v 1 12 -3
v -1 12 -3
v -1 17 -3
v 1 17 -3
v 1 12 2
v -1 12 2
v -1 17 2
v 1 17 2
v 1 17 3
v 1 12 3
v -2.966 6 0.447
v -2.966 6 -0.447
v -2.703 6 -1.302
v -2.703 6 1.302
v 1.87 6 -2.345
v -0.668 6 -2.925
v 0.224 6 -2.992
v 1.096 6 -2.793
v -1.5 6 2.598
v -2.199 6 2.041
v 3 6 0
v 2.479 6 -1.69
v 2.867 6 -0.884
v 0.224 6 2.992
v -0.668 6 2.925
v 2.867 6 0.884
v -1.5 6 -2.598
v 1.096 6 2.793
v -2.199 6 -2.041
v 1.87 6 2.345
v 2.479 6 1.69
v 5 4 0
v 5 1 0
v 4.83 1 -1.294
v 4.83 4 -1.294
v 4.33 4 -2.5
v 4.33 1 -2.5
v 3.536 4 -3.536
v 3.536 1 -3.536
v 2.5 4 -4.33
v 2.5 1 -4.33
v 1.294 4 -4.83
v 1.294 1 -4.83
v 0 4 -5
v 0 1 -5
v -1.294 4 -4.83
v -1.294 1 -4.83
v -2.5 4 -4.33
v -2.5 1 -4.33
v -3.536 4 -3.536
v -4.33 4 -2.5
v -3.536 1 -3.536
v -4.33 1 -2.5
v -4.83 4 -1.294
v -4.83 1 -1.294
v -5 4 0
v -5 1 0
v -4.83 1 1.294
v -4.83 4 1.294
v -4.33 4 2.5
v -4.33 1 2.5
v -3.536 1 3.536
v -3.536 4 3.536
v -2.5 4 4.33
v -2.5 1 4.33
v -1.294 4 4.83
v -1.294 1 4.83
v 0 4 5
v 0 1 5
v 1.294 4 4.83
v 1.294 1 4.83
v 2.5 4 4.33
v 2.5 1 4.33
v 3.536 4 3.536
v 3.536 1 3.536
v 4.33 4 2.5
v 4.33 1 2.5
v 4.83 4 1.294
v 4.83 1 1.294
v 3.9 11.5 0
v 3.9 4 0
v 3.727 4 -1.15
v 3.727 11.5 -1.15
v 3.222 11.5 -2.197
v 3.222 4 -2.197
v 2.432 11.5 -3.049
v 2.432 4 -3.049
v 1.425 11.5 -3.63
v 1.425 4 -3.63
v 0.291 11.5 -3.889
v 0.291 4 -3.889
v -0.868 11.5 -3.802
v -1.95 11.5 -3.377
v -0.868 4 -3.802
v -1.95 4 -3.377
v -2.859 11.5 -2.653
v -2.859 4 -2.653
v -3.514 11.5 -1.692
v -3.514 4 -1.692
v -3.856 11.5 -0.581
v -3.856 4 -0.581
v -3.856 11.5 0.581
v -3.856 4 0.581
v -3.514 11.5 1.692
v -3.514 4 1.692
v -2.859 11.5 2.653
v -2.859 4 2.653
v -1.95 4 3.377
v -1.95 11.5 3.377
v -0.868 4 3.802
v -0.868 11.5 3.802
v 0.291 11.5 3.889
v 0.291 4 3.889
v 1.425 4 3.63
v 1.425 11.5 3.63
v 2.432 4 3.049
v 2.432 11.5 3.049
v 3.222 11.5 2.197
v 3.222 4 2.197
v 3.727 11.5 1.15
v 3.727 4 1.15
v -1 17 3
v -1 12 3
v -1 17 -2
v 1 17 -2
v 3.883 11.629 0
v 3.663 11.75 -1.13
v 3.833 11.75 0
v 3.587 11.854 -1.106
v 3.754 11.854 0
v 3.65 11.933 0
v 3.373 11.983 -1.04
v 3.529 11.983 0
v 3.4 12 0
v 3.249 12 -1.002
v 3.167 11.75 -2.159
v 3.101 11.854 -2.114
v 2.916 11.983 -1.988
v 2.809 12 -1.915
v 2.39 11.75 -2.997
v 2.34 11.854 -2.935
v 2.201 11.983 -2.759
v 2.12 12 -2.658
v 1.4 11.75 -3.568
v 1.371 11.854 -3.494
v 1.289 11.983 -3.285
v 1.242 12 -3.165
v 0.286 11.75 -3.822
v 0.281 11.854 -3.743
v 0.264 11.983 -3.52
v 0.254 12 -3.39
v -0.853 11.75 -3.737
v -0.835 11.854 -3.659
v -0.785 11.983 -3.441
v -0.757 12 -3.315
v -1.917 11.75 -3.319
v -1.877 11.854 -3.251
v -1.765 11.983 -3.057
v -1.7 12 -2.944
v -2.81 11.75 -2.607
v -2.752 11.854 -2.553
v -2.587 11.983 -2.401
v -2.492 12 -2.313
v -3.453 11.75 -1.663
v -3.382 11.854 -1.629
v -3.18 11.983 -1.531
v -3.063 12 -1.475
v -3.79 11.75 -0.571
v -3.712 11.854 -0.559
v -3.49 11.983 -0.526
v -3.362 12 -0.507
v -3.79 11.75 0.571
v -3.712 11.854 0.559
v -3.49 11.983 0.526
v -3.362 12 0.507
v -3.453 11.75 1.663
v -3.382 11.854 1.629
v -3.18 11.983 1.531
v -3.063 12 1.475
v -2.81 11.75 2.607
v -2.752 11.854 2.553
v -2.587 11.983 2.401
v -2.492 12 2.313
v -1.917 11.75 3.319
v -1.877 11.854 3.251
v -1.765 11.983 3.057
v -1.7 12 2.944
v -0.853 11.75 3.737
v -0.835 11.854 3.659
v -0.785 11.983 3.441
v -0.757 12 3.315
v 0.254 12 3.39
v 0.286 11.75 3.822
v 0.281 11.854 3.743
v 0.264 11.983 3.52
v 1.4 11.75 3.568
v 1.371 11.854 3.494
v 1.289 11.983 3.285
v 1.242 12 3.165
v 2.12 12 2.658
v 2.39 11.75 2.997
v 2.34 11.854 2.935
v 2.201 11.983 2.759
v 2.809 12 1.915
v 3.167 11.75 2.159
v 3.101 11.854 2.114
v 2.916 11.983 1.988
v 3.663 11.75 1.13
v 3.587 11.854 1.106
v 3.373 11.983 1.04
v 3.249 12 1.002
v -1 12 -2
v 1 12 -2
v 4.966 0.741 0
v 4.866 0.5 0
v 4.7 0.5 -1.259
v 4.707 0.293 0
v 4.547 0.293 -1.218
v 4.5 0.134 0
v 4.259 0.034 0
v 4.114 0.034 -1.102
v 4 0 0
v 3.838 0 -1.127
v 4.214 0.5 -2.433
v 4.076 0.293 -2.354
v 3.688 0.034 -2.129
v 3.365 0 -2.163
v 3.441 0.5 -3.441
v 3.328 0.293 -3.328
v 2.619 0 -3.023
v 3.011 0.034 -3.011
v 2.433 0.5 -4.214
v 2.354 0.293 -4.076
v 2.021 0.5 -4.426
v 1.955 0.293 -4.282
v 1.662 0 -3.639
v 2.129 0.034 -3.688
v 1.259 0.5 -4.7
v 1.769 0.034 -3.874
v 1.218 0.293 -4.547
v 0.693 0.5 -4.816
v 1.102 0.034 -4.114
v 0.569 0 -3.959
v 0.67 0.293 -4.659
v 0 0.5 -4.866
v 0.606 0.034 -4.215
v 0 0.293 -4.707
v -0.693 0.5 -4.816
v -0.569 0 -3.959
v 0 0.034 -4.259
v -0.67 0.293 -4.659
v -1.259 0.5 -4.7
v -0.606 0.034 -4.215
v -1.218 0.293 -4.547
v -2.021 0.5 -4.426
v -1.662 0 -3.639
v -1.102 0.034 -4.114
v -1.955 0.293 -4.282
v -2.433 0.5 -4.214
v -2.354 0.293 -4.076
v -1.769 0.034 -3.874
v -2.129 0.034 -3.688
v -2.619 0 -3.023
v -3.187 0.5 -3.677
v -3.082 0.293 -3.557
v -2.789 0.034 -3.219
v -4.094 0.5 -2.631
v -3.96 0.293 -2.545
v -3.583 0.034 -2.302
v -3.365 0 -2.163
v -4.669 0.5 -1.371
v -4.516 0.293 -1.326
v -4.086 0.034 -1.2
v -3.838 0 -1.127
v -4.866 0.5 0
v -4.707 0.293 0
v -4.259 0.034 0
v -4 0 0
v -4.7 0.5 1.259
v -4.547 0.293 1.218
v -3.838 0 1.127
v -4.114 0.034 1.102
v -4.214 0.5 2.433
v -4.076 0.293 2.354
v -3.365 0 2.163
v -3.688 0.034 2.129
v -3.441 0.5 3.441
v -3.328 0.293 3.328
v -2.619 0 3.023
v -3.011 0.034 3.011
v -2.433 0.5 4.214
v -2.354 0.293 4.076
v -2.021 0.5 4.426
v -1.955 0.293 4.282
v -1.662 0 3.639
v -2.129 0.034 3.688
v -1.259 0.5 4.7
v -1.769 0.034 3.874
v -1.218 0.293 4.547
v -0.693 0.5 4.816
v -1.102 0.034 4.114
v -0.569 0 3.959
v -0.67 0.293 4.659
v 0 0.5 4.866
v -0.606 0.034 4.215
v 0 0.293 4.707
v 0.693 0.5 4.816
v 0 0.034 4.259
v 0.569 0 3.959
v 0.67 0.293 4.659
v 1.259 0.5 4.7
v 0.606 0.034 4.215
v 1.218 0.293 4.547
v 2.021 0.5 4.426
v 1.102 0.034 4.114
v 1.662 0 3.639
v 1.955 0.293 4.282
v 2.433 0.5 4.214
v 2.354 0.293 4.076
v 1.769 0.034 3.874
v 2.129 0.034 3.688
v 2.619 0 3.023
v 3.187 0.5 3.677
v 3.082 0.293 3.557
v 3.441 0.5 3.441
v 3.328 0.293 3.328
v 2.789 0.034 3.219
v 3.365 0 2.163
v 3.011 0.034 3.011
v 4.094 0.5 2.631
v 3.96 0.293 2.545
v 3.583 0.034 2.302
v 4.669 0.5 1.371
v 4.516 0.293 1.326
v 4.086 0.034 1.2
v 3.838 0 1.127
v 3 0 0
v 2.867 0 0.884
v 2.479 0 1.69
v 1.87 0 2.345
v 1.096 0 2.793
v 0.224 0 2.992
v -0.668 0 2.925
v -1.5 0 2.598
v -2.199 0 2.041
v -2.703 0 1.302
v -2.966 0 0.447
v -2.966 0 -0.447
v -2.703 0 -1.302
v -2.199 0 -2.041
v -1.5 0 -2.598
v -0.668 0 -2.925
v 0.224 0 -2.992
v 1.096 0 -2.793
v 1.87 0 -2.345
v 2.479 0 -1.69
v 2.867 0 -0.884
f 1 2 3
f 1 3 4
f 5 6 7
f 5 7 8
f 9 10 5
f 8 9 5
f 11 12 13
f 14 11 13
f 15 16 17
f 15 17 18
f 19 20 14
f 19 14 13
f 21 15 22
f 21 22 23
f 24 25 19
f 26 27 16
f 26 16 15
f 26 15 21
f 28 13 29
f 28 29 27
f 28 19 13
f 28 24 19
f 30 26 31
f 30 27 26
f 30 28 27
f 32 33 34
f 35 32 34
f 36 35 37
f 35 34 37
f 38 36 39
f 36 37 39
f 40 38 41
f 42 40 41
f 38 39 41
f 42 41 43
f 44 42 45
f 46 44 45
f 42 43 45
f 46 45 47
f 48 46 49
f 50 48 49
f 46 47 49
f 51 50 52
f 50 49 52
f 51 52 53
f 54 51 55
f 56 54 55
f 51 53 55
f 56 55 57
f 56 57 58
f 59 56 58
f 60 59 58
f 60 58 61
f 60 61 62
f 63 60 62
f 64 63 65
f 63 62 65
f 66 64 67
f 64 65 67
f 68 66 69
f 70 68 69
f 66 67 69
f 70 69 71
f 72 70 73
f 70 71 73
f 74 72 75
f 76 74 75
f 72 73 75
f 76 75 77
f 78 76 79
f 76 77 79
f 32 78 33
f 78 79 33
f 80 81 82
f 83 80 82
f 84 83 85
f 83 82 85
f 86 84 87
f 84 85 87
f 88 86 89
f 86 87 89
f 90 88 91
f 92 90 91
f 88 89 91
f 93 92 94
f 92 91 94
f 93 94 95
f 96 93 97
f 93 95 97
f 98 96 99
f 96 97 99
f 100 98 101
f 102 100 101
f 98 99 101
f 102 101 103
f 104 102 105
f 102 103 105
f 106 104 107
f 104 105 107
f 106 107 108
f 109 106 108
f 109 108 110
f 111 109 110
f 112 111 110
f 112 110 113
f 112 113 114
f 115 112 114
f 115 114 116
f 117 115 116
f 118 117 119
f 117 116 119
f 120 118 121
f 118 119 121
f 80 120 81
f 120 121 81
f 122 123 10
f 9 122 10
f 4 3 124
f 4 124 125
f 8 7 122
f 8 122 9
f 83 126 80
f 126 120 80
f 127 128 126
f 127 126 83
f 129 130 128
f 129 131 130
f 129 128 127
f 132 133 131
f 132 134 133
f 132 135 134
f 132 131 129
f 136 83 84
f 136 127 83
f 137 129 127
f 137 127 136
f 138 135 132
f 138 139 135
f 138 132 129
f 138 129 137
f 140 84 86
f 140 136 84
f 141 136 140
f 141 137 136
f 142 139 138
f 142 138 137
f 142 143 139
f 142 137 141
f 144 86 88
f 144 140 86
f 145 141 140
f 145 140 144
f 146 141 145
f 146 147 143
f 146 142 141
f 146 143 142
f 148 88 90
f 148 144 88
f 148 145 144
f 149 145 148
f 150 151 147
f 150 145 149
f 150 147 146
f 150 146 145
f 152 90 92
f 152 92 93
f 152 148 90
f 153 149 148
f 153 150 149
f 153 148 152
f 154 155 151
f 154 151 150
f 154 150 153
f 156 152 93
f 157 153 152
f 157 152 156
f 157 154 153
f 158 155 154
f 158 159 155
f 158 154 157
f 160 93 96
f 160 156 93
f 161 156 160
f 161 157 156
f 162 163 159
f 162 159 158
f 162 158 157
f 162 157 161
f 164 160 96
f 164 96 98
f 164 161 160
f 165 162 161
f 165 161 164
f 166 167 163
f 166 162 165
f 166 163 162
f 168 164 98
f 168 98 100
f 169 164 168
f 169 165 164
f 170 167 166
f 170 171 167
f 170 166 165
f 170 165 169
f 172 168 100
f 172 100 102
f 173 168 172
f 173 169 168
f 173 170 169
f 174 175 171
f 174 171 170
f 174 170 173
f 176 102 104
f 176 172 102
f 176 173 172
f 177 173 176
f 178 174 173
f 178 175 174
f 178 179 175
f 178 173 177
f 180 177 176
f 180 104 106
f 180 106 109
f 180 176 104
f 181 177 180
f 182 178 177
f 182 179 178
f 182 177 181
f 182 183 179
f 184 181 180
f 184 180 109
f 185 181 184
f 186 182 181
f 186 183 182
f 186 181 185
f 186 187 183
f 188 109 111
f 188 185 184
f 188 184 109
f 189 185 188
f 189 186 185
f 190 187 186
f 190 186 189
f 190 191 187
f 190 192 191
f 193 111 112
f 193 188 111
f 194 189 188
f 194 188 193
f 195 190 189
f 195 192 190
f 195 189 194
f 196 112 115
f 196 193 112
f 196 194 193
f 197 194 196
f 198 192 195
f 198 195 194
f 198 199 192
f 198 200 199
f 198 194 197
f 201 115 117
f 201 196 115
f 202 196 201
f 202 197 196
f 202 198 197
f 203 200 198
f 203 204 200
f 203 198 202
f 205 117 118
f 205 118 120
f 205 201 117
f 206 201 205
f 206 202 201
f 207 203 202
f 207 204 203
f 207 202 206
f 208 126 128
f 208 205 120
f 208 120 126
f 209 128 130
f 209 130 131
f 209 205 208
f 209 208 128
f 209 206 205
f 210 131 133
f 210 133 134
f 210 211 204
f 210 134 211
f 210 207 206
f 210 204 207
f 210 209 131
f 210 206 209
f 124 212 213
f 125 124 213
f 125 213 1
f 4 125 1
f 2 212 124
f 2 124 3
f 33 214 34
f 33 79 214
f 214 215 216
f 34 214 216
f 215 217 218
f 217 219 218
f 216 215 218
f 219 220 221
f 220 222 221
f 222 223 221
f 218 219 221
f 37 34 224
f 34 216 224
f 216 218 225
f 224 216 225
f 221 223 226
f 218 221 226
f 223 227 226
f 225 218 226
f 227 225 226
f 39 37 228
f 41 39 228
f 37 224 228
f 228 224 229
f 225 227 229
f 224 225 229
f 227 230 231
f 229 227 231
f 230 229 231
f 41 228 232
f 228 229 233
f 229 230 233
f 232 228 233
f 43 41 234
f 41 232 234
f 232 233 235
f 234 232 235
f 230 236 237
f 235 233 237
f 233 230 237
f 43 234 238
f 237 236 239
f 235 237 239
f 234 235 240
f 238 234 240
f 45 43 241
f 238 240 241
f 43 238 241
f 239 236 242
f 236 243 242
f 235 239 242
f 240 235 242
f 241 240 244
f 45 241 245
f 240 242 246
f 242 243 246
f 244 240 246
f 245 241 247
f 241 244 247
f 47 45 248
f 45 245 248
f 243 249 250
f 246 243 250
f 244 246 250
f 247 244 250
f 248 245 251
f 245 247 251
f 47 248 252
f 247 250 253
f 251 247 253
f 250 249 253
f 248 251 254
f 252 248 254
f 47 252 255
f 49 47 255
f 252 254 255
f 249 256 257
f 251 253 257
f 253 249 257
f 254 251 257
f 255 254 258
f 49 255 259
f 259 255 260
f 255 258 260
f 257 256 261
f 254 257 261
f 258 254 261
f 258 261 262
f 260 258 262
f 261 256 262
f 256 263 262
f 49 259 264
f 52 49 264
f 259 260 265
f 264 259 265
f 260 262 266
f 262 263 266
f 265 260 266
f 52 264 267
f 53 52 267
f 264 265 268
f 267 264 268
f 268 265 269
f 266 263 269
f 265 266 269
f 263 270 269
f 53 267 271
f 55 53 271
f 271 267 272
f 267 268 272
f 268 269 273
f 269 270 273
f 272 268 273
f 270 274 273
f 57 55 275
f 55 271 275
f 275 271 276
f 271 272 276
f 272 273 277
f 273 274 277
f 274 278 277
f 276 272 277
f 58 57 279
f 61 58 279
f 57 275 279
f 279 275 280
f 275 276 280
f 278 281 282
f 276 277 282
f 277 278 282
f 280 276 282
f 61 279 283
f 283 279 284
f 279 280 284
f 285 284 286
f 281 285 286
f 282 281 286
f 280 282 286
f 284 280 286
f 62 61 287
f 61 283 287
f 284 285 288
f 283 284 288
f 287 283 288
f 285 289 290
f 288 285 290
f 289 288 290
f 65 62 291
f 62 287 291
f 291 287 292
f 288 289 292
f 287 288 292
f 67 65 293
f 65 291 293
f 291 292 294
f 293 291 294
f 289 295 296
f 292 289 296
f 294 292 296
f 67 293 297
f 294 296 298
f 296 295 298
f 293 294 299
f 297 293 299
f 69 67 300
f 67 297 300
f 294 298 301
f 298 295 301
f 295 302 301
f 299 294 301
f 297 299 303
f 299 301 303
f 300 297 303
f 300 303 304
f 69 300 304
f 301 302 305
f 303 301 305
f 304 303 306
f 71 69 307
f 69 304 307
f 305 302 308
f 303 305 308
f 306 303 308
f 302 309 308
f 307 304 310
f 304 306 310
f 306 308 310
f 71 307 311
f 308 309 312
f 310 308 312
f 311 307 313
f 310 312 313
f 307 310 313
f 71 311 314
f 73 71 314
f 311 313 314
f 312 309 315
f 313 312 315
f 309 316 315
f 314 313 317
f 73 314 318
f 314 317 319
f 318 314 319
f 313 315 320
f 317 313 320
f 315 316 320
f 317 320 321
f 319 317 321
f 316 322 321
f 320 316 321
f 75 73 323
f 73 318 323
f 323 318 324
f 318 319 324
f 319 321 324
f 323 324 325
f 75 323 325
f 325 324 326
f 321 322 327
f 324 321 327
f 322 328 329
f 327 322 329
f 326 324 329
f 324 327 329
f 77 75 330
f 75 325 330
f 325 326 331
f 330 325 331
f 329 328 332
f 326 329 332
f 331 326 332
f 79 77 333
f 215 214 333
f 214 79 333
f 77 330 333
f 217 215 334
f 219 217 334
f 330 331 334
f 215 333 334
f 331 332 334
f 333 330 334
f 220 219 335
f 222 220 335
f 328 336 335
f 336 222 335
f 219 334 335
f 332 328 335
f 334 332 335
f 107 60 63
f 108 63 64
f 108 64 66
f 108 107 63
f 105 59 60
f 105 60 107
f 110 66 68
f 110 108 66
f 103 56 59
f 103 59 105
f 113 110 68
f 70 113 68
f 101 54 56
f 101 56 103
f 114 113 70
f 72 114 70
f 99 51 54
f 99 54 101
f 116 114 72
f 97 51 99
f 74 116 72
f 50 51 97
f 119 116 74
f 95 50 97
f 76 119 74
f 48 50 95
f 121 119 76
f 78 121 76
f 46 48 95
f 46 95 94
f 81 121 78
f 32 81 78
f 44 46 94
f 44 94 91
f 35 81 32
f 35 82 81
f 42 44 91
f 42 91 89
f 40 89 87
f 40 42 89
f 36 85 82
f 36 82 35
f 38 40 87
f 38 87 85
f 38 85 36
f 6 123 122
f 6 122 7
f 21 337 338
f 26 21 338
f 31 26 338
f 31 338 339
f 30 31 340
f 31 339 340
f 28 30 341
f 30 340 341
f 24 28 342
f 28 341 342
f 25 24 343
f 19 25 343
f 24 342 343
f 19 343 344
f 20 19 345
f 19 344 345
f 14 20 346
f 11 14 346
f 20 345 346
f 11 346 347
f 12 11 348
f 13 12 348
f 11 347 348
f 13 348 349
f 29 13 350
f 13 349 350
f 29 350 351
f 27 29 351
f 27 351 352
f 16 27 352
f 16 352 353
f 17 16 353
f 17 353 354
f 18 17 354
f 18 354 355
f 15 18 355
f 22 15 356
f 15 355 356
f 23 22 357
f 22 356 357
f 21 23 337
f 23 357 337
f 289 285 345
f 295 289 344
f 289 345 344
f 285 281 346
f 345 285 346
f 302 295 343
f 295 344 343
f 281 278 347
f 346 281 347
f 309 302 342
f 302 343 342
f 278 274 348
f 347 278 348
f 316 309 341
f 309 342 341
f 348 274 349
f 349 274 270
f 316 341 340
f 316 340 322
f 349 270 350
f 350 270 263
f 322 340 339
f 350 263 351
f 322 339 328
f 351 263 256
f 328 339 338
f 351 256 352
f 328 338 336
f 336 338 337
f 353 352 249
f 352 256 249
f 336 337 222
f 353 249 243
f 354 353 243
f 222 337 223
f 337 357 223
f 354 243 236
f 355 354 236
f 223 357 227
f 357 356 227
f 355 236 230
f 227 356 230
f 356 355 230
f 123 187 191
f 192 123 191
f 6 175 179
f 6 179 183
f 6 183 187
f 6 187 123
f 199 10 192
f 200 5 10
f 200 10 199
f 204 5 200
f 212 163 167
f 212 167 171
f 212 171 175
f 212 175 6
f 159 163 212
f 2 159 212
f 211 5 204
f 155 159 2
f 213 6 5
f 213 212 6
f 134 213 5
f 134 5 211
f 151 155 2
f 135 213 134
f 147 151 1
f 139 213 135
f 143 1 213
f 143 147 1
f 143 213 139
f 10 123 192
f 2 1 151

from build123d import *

# Parameters (mm, degrees)
ESQUISSE1_R             = 5
BOSS_EXTRU_1_DEPTH      = 4
ESQUISSE2_R             = 3.9
BOSS_EXTRU_2_DEPTH      = 8
CONG_1_R                = 1
ESQUISSE3_R             = 3
ENL_V_MAT_EXTRU_2_DEPTH = 6
ESQUISSE4_W             = 2
ESQUISSE4_H             = 1
BOSS_EXTRU_3_DEPTH      = 5
CONG_2_R                = 0.5


with BuildPart() as part:
    # Esquisse1 → Boss.-Extru.1 (new body)
    with BuildSketch(Plane(origin=(0, 0, 0), x_dir=(1, 0, 0), z_dir=(0, 1, 0))):
        Circle(ESQUISSE1_R)
    extrude(amount=BOSS_EXTRU_1_DEPTH)

    # Esquisse2 → Boss.-Extru.2 (add)
    with BuildSketch(Plane(origin=(0, 4, 0), x_dir=(1, 0, 0), z_dir=(0, 1, 0))):
        Circle(ESQUISSE2_R)
    extrude(amount=BOSS_EXTRU_2_DEPTH)

    # Congé1
    cong_1_edges = [part.edges().sort_by_distance(p)[0] for p in [
        (-5, 0, 0),
    ]]
    fillet(cong_1_edges, radius=CONG_1_R)

    # Esquisse3 → Enlèv. mat.-Extru.2 (cut)
    with BuildSketch(Plane.XZ):
        Circle(ESQUISSE3_R)
    extrude(amount=-ENL_V_MAT_EXTRU_2_DEPTH, mode=Mode.SUBTRACT)

    # Esquisse4 → Boss.-Extru.3 (add)
    with BuildSketch(Plane(origin=(0, 12, 0), x_dir=(1, 0, 0), z_dir=(0, 1, 0))):
        with Locations((0, -2.5)):
            Rectangle(ESQUISSE4_W, ESQUISSE4_H)
        with Locations((0, 2.5)):
            Rectangle(ESQUISSE4_W, ESQUISSE4_H)
    extrude(amount=BOSS_EXTRU_3_DEPTH)

    # Congé2
    cong_2_edges = [part.edges().sort_by_distance(p)[0] for p in [
        (-3.9, 12, 0),
    ]]
    fillet(cong_2_edges, radius=CONG_2_R)


solid = part.part
